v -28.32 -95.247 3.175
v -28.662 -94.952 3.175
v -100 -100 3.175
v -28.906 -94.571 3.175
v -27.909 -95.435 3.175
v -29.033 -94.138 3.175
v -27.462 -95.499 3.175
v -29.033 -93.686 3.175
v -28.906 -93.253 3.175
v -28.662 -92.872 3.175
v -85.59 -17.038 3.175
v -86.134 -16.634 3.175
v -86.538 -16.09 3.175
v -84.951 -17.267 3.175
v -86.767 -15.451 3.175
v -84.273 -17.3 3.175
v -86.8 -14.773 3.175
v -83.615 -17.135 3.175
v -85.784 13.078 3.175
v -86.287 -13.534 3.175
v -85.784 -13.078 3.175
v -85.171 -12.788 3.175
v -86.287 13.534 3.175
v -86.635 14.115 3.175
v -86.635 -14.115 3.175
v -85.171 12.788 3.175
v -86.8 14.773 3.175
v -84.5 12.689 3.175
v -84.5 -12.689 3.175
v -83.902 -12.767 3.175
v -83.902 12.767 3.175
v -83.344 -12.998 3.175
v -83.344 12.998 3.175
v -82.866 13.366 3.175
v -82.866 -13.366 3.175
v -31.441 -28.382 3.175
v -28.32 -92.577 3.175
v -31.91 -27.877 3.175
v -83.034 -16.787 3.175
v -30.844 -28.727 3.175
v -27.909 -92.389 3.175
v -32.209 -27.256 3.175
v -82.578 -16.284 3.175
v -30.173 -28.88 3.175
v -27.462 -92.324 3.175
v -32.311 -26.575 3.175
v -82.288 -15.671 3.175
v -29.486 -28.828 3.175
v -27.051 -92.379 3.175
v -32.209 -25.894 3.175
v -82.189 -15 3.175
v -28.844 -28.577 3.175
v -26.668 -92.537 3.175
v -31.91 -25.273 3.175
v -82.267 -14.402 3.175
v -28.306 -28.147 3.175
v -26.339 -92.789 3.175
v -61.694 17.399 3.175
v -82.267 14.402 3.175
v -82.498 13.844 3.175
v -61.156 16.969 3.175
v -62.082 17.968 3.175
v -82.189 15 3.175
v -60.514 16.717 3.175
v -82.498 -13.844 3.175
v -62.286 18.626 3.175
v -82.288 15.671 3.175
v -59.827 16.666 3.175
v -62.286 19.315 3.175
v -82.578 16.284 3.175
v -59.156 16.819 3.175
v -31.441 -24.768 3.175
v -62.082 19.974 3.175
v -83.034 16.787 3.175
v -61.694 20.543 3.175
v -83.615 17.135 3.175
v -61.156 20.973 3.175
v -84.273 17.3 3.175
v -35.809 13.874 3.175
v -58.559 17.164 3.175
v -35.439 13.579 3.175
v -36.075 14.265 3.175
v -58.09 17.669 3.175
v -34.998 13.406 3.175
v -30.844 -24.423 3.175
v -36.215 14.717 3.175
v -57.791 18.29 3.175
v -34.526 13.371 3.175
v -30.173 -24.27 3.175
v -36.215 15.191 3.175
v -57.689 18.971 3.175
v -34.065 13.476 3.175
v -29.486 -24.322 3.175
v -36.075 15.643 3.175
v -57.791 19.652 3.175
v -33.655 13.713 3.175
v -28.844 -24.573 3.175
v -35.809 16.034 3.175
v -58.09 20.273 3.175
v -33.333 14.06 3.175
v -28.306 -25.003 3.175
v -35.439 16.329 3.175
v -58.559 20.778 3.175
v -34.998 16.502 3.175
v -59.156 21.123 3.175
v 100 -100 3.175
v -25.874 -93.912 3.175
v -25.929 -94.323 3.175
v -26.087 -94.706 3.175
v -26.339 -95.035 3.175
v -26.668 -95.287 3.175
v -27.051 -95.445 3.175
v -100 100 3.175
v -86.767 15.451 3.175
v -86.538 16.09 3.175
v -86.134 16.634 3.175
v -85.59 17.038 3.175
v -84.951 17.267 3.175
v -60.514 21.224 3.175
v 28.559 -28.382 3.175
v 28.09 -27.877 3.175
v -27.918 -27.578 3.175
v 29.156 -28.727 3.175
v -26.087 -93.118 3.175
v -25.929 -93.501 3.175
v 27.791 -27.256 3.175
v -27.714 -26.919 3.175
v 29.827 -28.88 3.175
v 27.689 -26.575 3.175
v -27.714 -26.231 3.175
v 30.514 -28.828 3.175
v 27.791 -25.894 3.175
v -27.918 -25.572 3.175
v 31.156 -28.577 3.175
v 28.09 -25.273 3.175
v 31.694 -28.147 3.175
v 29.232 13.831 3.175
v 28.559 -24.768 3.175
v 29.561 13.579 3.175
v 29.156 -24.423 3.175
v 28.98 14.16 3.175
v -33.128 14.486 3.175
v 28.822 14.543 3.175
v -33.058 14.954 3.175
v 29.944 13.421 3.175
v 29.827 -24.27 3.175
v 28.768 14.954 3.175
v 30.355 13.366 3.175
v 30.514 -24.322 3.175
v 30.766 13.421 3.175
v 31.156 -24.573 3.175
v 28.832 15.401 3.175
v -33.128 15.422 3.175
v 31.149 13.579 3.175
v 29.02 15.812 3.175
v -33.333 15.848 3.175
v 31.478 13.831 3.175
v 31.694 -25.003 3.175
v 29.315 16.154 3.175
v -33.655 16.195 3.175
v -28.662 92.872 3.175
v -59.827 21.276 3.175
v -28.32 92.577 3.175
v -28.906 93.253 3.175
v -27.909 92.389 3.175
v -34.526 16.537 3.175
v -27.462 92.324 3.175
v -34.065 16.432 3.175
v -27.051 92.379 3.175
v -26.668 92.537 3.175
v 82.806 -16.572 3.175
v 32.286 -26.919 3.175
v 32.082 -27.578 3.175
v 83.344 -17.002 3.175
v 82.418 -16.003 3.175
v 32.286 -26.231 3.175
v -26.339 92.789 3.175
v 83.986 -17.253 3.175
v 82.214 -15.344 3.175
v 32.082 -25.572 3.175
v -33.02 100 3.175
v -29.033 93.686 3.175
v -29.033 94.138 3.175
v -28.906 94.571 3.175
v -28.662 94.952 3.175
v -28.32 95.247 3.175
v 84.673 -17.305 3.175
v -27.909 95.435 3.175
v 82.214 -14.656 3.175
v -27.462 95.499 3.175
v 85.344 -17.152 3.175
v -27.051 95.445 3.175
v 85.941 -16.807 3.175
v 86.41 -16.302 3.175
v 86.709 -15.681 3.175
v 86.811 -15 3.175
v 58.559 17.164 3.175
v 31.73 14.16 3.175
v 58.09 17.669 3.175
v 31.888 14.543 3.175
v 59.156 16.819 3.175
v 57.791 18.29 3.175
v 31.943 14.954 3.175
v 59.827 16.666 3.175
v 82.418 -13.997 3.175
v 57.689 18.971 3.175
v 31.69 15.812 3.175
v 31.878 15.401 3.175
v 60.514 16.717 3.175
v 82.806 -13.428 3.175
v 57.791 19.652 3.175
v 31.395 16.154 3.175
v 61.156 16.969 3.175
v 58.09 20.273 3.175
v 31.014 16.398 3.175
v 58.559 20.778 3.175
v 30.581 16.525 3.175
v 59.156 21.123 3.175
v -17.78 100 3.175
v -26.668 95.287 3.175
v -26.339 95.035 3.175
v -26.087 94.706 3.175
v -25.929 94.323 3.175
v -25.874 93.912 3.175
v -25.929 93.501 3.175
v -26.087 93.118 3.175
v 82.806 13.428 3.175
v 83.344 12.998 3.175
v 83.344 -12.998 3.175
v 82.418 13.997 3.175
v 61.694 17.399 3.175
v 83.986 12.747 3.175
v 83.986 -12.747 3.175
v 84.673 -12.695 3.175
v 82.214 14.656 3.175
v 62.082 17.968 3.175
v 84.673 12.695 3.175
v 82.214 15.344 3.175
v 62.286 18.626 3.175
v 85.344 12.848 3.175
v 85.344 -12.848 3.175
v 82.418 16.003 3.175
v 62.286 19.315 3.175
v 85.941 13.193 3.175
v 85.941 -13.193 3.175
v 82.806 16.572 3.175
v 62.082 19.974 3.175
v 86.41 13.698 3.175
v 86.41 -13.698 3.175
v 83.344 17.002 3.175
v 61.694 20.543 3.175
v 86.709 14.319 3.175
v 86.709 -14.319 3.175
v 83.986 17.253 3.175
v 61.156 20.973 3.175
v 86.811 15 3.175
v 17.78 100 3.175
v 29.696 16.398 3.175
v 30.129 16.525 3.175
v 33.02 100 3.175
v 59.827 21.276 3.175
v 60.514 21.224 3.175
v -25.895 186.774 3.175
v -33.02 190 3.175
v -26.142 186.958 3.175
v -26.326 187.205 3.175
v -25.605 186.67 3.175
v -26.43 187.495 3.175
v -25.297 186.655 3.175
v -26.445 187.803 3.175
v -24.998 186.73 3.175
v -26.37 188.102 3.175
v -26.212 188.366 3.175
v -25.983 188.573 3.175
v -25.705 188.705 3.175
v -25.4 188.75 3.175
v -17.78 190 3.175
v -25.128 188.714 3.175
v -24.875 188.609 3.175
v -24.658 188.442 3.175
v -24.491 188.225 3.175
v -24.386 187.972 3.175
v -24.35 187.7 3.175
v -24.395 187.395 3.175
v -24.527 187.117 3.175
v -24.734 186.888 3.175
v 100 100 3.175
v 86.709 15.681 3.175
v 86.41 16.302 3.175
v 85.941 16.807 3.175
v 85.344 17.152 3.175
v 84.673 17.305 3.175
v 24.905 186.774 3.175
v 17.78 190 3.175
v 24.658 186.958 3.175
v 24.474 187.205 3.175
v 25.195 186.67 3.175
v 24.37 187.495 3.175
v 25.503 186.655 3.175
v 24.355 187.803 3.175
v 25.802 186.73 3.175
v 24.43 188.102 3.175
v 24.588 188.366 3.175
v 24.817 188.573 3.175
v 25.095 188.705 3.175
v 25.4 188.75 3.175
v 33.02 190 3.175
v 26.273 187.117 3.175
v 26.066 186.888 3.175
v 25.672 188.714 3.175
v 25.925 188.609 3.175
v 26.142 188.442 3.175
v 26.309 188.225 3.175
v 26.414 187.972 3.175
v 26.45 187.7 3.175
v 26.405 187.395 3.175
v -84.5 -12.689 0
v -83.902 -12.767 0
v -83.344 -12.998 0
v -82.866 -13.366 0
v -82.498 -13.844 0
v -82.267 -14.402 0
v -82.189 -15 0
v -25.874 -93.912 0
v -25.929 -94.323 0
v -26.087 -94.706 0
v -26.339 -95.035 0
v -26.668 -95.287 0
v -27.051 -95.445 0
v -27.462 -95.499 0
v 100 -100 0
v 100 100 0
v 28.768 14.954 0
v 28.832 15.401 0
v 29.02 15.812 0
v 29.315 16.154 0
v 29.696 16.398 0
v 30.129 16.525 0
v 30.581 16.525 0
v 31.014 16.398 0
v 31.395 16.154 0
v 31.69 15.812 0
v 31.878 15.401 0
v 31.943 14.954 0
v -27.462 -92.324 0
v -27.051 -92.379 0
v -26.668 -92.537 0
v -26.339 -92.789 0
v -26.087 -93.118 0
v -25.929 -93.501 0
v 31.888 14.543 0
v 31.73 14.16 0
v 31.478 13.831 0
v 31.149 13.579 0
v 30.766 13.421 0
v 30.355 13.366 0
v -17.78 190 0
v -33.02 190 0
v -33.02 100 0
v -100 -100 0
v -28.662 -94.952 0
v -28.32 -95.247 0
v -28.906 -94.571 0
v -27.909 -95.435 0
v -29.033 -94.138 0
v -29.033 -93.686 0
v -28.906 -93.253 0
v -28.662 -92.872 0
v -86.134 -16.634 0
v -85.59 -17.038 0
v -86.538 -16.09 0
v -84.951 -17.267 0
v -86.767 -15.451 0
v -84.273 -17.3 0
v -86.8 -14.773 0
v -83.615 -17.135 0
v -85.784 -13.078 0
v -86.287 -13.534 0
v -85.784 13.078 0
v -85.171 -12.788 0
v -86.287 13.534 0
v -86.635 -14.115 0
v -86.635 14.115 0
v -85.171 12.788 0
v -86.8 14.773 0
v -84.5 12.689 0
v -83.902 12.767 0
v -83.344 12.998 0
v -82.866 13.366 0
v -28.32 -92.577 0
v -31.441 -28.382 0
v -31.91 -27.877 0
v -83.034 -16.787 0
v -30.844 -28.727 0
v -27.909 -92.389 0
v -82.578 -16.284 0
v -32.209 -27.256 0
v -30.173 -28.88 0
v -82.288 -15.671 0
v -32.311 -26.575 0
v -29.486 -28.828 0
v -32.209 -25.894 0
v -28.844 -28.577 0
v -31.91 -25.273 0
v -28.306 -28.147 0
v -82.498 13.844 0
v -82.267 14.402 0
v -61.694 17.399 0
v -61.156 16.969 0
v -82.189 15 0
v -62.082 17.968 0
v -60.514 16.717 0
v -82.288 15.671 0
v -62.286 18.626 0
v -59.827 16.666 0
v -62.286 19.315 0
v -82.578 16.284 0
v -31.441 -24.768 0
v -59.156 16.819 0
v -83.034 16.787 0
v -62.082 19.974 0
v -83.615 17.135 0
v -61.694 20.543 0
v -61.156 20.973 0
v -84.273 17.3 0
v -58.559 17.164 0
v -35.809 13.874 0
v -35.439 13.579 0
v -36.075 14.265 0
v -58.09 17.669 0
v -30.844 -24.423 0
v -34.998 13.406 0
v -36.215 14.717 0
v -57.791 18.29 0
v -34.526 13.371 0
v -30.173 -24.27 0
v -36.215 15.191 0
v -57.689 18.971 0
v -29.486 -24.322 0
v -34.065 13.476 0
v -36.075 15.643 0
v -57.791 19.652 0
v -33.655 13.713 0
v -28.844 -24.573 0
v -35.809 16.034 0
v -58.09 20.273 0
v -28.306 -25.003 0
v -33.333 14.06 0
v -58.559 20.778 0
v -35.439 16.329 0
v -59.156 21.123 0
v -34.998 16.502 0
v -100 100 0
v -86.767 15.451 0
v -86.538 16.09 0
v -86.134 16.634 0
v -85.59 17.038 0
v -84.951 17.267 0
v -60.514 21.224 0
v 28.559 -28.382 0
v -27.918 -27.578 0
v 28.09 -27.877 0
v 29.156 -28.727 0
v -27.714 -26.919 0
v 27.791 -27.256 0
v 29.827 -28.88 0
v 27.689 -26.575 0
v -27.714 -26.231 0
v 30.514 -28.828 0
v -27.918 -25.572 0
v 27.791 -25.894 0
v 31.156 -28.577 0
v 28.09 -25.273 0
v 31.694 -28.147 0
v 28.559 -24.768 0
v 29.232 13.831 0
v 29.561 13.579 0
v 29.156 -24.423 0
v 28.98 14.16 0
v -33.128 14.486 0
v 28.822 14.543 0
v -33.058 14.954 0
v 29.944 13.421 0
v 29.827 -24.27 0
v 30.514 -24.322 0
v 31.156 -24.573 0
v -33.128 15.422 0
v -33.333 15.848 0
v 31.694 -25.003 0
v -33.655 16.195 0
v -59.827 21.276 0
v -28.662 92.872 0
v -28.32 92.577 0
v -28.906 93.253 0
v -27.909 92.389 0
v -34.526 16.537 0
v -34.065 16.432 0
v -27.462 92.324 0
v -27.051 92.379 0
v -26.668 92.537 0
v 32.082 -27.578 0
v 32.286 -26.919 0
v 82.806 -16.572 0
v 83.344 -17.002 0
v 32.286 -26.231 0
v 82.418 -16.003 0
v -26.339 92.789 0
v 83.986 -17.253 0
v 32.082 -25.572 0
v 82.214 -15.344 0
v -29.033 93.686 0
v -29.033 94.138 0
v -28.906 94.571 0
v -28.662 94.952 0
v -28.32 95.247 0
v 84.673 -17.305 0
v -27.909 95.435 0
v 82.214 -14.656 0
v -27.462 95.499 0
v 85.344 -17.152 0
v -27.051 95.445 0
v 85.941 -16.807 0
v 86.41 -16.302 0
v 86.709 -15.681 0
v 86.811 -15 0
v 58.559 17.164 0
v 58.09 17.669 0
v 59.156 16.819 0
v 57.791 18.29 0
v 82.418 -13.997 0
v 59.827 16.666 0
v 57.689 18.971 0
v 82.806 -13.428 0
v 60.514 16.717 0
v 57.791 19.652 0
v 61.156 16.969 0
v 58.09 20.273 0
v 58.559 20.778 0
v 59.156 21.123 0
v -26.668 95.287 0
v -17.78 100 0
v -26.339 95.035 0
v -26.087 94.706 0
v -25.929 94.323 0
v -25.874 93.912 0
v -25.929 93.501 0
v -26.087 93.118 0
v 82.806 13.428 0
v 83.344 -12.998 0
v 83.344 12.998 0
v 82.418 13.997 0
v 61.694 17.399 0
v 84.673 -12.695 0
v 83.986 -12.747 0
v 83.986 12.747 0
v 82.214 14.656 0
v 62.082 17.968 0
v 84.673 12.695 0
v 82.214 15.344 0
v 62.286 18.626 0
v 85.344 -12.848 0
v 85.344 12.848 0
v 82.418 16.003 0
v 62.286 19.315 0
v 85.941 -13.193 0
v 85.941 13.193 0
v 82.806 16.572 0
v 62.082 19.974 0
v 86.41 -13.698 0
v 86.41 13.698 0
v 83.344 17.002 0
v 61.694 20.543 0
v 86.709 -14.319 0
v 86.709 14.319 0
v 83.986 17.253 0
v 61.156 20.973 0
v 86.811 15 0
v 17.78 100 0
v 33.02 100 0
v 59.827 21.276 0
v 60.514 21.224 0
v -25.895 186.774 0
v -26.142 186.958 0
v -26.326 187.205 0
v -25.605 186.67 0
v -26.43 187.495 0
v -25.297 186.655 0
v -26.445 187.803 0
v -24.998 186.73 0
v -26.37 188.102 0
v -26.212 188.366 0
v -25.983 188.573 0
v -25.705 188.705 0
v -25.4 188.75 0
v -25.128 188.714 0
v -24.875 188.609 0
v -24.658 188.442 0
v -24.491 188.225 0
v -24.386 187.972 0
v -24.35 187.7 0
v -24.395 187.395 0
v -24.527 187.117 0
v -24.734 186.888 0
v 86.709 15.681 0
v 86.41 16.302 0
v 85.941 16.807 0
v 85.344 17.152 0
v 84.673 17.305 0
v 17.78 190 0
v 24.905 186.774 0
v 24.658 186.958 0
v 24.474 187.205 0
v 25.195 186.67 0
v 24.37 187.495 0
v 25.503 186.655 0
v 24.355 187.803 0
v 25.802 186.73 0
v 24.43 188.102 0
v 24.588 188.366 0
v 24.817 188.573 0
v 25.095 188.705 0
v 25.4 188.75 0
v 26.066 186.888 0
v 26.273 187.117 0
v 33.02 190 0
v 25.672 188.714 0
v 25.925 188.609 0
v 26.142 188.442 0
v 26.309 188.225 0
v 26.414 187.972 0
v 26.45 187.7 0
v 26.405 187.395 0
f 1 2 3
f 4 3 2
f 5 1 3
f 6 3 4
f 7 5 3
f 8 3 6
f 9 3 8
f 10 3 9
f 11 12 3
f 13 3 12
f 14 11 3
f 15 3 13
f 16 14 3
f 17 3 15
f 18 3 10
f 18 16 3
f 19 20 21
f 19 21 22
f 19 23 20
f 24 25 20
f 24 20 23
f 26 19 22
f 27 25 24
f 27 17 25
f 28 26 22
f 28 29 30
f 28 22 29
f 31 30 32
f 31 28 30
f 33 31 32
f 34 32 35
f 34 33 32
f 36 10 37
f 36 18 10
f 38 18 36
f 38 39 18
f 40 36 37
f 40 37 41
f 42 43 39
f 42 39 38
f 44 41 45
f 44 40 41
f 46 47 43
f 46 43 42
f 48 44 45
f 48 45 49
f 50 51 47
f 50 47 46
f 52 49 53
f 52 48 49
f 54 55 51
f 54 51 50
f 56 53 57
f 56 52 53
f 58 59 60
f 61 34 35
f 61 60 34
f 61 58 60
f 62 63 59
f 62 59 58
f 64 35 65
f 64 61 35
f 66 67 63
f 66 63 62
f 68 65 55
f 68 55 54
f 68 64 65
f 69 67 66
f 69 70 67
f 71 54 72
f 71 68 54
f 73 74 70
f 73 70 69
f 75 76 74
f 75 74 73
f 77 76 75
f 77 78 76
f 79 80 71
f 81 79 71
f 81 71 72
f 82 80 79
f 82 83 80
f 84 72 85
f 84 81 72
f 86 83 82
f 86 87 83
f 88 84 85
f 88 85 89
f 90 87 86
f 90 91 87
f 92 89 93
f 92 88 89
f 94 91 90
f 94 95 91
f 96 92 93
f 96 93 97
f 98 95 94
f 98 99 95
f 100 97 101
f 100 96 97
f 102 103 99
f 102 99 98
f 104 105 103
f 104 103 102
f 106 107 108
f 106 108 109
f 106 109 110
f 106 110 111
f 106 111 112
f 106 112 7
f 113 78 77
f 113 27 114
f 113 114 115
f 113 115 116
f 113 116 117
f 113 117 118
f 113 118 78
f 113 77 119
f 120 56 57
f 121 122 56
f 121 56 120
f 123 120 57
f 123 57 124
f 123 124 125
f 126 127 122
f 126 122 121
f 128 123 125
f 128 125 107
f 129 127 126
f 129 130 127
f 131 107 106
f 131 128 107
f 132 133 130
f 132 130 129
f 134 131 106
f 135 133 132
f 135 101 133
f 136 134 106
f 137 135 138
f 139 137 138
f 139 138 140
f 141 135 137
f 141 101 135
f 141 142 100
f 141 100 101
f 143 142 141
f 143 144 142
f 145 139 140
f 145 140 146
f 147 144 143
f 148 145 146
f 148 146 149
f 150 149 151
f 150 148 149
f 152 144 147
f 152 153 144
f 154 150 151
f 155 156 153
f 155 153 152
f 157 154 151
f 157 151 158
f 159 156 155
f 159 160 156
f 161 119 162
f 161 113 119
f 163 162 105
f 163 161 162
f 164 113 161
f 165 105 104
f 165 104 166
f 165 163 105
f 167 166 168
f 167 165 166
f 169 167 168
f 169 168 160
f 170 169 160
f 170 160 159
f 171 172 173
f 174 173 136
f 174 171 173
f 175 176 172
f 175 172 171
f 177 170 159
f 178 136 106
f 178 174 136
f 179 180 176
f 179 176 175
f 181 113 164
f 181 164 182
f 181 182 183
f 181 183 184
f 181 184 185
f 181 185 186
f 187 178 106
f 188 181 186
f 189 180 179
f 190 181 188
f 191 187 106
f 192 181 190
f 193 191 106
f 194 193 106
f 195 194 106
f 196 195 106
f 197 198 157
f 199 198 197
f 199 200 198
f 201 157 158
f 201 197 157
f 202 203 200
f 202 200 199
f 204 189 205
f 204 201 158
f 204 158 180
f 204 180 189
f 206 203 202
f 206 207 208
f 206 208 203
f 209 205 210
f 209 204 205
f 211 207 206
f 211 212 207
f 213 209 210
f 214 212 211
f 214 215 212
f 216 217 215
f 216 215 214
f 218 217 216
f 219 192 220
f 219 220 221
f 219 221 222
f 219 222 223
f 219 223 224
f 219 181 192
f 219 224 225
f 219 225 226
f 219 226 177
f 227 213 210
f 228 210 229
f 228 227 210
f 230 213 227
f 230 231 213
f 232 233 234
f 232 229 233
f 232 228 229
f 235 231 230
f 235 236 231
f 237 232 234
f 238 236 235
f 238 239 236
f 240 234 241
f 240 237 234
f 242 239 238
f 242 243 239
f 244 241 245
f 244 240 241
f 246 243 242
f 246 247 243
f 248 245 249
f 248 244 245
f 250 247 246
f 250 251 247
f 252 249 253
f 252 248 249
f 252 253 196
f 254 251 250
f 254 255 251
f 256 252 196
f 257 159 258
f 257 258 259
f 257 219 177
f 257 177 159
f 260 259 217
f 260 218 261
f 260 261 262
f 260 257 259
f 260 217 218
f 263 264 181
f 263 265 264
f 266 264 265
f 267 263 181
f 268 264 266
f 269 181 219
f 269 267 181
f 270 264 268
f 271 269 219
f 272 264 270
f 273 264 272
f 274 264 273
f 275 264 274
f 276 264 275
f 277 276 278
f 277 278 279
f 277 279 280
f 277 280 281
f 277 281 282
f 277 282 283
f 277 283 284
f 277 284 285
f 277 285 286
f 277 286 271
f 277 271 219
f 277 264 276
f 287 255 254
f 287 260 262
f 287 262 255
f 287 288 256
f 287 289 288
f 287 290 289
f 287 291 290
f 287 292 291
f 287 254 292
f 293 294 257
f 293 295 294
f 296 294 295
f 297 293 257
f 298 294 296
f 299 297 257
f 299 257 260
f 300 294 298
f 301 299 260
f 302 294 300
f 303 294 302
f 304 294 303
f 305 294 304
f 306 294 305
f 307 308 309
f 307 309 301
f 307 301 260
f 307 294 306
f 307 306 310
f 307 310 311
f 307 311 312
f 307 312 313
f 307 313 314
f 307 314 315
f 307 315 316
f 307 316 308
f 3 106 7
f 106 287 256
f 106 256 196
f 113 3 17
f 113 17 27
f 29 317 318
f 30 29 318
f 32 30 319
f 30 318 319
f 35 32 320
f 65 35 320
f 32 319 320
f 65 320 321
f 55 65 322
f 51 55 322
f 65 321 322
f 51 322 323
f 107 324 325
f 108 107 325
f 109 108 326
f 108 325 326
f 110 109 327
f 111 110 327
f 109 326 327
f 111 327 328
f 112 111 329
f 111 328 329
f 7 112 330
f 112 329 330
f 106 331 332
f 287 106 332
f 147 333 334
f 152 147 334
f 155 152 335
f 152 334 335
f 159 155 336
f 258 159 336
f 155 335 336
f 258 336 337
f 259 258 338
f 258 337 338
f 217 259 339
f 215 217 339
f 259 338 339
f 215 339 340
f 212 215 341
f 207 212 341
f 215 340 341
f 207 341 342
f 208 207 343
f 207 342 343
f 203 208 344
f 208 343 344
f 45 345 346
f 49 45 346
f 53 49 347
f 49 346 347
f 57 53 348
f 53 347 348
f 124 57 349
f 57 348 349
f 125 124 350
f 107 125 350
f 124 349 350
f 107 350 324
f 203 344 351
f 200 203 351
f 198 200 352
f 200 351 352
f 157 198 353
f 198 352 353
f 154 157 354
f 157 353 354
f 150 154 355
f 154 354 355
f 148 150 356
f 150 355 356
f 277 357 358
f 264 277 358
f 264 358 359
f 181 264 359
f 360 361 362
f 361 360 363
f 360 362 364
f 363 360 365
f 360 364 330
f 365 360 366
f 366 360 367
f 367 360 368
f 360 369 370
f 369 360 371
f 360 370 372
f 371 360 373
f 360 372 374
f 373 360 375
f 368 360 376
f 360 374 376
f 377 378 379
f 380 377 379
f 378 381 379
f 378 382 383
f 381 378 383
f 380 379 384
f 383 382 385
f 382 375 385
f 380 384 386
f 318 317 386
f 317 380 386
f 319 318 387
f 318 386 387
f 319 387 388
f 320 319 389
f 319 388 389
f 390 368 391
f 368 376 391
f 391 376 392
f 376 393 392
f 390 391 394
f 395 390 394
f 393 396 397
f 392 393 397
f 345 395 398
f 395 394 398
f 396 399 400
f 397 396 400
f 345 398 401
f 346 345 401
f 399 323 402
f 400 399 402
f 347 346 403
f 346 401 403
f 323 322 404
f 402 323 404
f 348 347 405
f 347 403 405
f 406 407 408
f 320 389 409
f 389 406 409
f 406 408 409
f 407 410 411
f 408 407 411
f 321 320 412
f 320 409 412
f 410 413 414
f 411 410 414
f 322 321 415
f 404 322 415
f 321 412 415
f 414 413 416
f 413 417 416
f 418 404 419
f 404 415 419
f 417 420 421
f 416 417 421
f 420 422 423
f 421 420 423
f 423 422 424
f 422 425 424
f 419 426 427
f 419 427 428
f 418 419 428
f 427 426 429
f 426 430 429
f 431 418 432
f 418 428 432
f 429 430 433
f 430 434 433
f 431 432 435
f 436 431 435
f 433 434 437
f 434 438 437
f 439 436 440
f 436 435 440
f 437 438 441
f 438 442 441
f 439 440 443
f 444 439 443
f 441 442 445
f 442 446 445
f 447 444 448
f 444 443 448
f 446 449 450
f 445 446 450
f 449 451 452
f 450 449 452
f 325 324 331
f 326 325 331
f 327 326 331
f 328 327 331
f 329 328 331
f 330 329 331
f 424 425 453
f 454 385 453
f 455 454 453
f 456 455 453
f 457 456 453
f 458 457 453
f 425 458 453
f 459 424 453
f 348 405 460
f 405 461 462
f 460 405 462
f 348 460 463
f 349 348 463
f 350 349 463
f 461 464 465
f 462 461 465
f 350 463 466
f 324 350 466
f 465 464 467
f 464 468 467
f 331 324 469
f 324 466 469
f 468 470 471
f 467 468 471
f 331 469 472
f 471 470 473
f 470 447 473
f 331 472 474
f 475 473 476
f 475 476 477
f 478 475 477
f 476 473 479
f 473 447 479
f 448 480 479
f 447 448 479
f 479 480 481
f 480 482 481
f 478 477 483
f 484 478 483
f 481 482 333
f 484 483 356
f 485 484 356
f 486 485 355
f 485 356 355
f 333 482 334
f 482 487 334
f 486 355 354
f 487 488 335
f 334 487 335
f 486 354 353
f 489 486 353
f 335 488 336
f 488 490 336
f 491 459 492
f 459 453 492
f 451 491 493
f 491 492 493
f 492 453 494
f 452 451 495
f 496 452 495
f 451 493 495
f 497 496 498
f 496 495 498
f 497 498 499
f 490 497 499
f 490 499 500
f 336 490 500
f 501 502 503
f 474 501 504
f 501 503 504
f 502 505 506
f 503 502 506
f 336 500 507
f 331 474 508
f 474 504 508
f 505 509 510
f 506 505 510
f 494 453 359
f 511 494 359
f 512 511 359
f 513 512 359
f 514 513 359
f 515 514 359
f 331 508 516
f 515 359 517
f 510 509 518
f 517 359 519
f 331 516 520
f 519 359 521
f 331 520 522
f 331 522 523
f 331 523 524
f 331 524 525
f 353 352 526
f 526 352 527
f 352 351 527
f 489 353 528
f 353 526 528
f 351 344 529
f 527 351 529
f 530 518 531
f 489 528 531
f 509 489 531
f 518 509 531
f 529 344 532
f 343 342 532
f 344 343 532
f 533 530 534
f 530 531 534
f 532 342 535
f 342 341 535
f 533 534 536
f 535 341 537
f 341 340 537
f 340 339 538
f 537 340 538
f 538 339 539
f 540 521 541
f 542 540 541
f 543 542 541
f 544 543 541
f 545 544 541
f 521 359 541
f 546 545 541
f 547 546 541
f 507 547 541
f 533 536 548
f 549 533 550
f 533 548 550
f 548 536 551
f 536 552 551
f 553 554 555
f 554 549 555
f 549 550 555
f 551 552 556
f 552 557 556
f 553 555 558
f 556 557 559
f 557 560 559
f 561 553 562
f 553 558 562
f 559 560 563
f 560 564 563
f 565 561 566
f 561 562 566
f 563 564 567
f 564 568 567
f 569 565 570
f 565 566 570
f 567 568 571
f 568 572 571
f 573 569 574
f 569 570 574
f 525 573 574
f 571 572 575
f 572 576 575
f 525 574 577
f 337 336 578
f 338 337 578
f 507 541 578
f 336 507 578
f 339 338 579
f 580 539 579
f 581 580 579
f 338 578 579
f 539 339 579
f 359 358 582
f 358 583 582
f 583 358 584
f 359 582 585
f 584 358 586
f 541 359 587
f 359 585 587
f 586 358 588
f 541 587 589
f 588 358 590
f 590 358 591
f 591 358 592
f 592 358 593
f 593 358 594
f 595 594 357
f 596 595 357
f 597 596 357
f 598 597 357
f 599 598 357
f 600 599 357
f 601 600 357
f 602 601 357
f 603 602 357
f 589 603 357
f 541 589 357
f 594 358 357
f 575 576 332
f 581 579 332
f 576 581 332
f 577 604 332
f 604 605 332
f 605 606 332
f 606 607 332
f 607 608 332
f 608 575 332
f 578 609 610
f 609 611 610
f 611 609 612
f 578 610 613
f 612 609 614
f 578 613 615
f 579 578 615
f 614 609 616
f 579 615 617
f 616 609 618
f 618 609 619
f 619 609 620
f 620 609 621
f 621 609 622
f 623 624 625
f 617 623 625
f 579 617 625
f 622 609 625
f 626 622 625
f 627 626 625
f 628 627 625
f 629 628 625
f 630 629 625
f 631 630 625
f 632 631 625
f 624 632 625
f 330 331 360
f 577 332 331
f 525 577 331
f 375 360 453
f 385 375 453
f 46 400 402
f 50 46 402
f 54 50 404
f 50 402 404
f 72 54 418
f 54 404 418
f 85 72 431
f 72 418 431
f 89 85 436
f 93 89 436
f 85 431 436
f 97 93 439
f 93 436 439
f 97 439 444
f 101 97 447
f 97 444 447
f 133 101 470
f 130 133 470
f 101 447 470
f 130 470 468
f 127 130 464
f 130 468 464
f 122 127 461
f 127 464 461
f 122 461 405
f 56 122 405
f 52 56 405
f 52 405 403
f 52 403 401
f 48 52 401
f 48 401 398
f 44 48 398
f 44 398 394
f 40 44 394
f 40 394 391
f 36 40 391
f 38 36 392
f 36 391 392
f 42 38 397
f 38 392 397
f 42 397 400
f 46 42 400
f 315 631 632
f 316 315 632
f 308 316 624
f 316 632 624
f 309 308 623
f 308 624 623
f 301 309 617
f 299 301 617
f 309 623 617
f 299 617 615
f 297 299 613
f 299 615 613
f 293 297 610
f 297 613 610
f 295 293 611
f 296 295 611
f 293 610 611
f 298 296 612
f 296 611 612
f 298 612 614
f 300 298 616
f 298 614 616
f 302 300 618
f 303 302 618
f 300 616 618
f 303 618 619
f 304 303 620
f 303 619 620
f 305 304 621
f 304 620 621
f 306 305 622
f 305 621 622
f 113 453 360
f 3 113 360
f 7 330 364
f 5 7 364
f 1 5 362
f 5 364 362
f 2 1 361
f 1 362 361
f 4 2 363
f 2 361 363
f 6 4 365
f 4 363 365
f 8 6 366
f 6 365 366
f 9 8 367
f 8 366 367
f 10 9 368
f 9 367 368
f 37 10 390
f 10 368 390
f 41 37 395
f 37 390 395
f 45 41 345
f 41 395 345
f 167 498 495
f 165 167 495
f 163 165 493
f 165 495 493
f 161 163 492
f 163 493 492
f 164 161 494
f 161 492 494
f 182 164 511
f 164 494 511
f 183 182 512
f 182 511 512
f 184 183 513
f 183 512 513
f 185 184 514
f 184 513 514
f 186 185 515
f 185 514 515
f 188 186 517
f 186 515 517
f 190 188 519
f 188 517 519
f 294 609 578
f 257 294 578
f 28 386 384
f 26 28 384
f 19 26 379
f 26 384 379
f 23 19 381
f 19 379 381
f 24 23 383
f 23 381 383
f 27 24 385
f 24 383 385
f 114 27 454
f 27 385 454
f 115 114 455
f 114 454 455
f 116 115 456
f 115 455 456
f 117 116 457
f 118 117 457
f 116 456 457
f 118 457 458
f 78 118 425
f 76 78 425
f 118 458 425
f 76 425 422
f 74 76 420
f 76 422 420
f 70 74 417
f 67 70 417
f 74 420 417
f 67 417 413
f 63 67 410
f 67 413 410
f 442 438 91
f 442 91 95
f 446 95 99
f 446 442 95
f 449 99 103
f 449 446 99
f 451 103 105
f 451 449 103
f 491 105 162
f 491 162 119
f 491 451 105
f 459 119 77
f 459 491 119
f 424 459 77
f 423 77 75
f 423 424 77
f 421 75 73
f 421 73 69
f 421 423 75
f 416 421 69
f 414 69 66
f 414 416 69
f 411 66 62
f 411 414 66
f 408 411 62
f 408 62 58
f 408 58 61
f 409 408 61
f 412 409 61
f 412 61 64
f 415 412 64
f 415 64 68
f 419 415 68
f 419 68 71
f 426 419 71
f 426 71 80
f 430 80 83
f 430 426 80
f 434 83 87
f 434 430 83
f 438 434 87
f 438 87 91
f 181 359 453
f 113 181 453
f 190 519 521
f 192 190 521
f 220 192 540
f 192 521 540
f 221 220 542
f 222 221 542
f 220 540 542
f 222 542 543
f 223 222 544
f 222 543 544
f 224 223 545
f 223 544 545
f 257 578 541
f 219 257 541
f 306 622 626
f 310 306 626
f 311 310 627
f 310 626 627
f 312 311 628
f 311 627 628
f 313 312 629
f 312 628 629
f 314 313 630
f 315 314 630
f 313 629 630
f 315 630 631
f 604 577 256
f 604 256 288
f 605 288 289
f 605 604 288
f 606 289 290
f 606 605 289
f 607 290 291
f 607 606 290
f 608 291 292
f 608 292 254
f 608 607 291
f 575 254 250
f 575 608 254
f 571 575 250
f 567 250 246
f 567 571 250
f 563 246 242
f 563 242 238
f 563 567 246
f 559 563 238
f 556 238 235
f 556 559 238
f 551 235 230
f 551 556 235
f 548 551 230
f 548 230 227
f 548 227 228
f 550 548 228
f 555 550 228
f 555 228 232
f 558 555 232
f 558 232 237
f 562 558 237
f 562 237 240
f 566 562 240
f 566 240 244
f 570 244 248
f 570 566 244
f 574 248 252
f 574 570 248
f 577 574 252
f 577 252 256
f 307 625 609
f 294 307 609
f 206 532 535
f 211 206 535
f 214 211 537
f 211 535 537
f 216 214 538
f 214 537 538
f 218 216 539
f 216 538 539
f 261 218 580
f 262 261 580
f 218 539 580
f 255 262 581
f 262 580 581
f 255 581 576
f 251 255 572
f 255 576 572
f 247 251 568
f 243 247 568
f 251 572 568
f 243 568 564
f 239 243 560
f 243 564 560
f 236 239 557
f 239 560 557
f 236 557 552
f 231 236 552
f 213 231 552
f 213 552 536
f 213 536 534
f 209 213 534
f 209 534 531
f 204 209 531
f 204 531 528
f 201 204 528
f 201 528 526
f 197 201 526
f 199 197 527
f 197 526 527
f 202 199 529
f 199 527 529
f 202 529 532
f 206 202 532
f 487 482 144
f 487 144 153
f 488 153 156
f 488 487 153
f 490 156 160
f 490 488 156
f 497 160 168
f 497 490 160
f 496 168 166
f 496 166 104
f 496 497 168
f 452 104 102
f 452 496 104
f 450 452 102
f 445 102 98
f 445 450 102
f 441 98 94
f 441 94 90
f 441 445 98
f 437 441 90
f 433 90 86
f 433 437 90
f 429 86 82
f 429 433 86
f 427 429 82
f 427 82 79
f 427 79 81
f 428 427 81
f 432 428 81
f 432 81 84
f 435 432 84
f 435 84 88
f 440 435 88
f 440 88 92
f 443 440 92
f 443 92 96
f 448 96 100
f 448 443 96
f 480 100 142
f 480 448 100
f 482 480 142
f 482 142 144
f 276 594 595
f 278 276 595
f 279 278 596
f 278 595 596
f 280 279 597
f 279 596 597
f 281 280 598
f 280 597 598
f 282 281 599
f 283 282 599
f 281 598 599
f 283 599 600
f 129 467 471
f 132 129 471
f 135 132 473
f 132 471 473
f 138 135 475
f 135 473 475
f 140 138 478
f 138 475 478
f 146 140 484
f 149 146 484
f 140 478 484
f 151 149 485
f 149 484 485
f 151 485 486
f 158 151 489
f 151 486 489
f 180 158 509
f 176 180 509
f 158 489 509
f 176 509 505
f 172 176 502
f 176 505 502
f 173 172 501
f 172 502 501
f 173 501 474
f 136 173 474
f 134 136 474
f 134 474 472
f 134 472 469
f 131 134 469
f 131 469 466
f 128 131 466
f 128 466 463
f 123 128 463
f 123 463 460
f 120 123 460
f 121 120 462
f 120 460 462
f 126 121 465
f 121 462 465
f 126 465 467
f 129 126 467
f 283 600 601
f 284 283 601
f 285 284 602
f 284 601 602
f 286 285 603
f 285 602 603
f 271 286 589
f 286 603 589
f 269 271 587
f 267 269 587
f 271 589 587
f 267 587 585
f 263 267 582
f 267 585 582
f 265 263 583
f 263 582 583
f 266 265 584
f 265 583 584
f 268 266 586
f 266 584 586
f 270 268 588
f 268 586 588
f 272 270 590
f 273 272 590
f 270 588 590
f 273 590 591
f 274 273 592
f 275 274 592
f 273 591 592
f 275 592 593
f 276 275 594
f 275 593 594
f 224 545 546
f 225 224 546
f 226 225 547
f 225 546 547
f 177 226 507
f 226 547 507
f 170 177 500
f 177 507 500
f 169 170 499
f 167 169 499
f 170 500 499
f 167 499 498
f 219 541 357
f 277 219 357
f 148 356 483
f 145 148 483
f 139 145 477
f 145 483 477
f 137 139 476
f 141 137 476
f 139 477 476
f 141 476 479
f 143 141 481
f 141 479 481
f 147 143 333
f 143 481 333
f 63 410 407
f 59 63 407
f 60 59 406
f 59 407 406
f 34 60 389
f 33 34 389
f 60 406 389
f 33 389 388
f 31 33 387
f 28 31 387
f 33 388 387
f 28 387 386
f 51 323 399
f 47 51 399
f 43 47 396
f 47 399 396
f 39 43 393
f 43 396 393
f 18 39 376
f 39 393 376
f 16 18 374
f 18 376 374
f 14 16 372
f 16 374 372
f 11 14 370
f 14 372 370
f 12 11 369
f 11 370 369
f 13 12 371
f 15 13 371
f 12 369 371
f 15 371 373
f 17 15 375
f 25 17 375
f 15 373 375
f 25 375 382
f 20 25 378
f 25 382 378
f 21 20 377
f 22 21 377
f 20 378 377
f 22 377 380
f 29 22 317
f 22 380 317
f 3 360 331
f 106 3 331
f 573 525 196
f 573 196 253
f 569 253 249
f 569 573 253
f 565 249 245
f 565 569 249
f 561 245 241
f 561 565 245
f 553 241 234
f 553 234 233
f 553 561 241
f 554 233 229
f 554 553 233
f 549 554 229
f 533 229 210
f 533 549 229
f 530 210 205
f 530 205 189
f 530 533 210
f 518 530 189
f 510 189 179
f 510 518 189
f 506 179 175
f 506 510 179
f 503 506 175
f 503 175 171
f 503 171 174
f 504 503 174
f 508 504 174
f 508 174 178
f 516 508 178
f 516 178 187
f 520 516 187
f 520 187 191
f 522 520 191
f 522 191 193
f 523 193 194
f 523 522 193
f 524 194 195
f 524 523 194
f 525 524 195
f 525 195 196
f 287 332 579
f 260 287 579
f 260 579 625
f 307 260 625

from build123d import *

# Parameters (mm, degrees)
F0_W     = 51.8
F0_H     = 10
F0_W_2   = 15.24
F0_H_2   = 34.925
F0_R     = 2.3114
F0_R_2   = 1.05
F0_R_3   = 1.5875
F0_W_3   = 9.38
F1_DEPTH = 3.175
F2_DEPTH = 90


# Not quite as in the source:
# - a length typed as a fraction of an inch, garbled in the dataset ("3 / 203.2 mm" for 3/8 in), is restored
# - a feature names something its author has since deleted; it is built from what else it names


with BuildPart() as f1:
    # F0 (on Top) → F1 (new body)
    with BuildSketch(Plane.XY):
        Polygon((42.4, -100), (100, -100), (100, -75.075), (48.2, -75.075), (48.2, -65.075), (33.02, -65.075), (33.02, -100), align=None)
        with Locations((74.1, -70.075)):
            Rectangle(F0_W, F0_H)
        Polygon((33.02, -140), (33.02, -100), (17.78, -100), (17.78, -140), (17.78, -190), (25.4, -190), (33.02, -190), align=None)
        with BuildLine():
            ThreePointArc((26.45, -187.7), (26.1424621202, -188.4424621202), (25.4, -188.75))
            ThreePointArc((25.4, -188.75), (24.6575378798, -186.9575378798), (26.45, -187.7))
        make_face(mode=Mode.SUBTRACT)
        with Locations((25.4, -82.5375)):
            Rectangle(F0_W_2, F0_H_2)
        with Locations((74.1, -60.075)):
            Rectangle(F0_W, F0_H)
        Polygon((0, -100), (17.78, -100), (17.78, -65.075), (-17.78, -65.075), (-17.78, -100), align=None)
        Polygon((17.78, -65.075), (33.02, -65.075), (48.2, -65.075), (48.2, -55.075), (-48.2, -55.075), (-48.2, -65.075), (-33.02, -65.075), (-17.78, -65.075), align=None)
        with BuildLine():
            Line((48.2, -55.075), (100, -55.075))
            Line((100, -55.075), (100, -26.575))
            Line((100, -26.575), (32.3114, -26.575))
            ThreePointArc((32.3114, -26.575), (30, -28.8864), (27.6886, -26.575))
            Line((27.6886, -26.575), (0, -26.575))
            Line((0, -26.575), (-27.6886, -26.575))
            ThreePointArc((-27.6886, -26.575), (-30, -28.8864), (-32.3114, -26.575))
            Line((-32.3114, -26.575), (-100, -26.575))
            Line((-100, -26.575), (-100, -55.075))
            Line((-100, -55.075), (-48.2, -55.075))
            Line((-48.2, -55.075), (48.2, -55.075))
        make_face()
        with BuildLine():
            Line((32.3114, -26.575), (100, -26.575))
            Line((100, -26.575), (100, 0))
            Line((100, 0), (0, 0))
            Line((0, 0), (0, -10.4469014332))
            Line((0, -10.4469014332), (0, -26.575))
            Line((0, -26.575), (27.6886, -26.575))
            ThreePointArc((27.6886, -26.575), (30, -24.2636), (32.3114, -26.575))
        make_face()
        with Locations((84.5, -15)):
            Circle(F0_R, mode=Mode.SUBTRACT)
        Polygon((-17.78, -140), (-17.78, -100), (-27.462, -100), (-33.02, -100), (-33.02, -140), (-33.02, -190), (-25.4, -190), (-17.78, -190), align=None)
        with BuildLine():
            ThreePointArc((-24.35, -187.7), (-24.6575378798, -188.4424621202), (-25.4, -188.75))
            ThreePointArc((-25.4, -188.75), (-26.1424621202, -186.9575378798), (-24.35, -187.7))
        make_face(mode=Mode.SUBTRACT)
        with Locations((-25.4, -137.7)):
            Circle(F0_R_2, mode=Mode.SUBTRACT)
        Polygon((-27.462, -100), (-17.78, -100), (-17.78, -65.075), (-33.02, -65.075), (-33.02, -100), align=None)
        with BuildLine():
            ThreePointArc((-25.8745, -93.912), (-26.3394679849, -95.0345320151), (-27.462, -95.4995))
            ThreePointArc((-27.462, -95.4995), (-29.0495, -93.912), (-27.462, -92.3245))
            ThreePointArc((-27.462, -92.3245), (-26.3394679849, -92.7894679849), (-25.8745, -93.912))
        make_face(mode=Mode.SUBTRACT)
        with BuildLine():
            Line((0, 0), (100, 0))
            Line((100, 0), (100, 55.075))
            Line((100, 55.075), (48.2, 55.075))
            Line((48.2, 55.075), (48.2, 65.075))
            Line((48.2, 65.075), (42.4, 65.075))
            Line((42.4, 65.075), (42.4, 18.9709383994))
            Line((42.4, 18.9709383994), (42.4, 9.75))
            Line((42.4, 9.75), (30.355, 9.75))
            Line((30.355, 9.75), (-42.4, 9.75))
            Line((-42.4, 9.75), (-42.4, 65.075))
            Line((-42.4, 65.075), (-48.2, 65.075))
            Line((-48.2, 65.075), (-48.2, 55.075))
            Line((-48.2, 55.075), (-100, 55.075))
            Line((-100, 55.075), (-100, 0))
            Line((-100, 0), (-100, -26.575))
            Line((-100, -26.575), (-32.3114, -26.575))
            ThreePointArc((-32.3114, -26.575), (-30, -24.2636), (-27.6886, -26.575))
            Line((-27.6886, -26.575), (0, -26.575))
            Line((0, -26.575), (0, -10.4469014332))
            Line((0, -10.4469014332), (0, 0))
        make_face()
        with BuildLine():
            ThreePointArc((-82.1886, -15), (-86.134406614, -16.634406614), (-84.5, -12.6886))
            ThreePointArc((-84.5, -12.6886), (-82.865593386, -13.365593386), (-82.1886, -15))
        make_face(mode=Mode.SUBTRACT)
        with BuildLine():
            ThreePointArc((-82.1886, 15), (-82.865593386, 13.365593386), (-84.5, 12.6886))
            ThreePointArc((-84.5, 12.6886), (-86.134406614, 16.634406614), (-82.1886, 15))
        make_face(mode=Mode.SUBTRACT)
        with Locations((-60, 18.9709383994)):
            Circle(F0_R, mode=Mode.SUBTRACT)
        with BuildLine():
            ThreePointArc((62.3114, 18.9709383994), (60, 16.6595383994), (57.6886, 18.9709383994))
            ThreePointArc((57.6886, 18.9709383994), (60, 21.2823383994), (62.3114, 18.9709383994))
        make_face(mode=Mode.SUBTRACT)
        with Locations((84.5, 15)):
            Circle(F0_R, mode=Mode.SUBTRACT)
        with Locations((-74.1, -60.075)):
            Rectangle(F0_W, F0_H)
        Polygon((-33.02, -100), (-33.02, -65.075), (-48.2, -65.075), (-48.2, -75.075), (-100, -75.075), (-100, -100), (-42.4, -100), align=None)
        with Locations((74.1, 60.075)):
            Rectangle(F0_W, F0_H)
        with Locations((-74.1, -70.075)):
            Rectangle(F0_W, F0_H)
        with Locations((74.1, 70.075)):
            Rectangle(F0_W, F0_H)
        Polygon((48.2, 75.075), (100, 75.075), (100, 100), (42.4, 100), (42.4, 65.075), (48.2, 65.075), align=None)
        Polygon((42.4, 18.9709383994), (42.4, 65.075), (42.4, 100), (33.02, 100), (17.78, 100), (0, 100), (-17.78, 100), (-27.462, 100), (-33.02, 100), (-33.02, 65.075), (-42.4, 65.075), (-42.4, 9.75), (30.355, 9.75), (42.4, 9.75), align=None)
        with Locations((-34.645, 14.954)):
            Circle(F0_R_3, mode=Mode.SUBTRACT)
        with BuildLine():
            ThreePointArc((-27.462, 92.3245), (-29.0495, 93.912), (-27.462, 95.4995))
            ThreePointArc((-27.462, 95.4995), (-26.3394679849, 95.0345320151), (-25.8745, 93.912))
            ThreePointArc((-25.8745, 93.912), (-26.3394679849, 92.7894679849), (-27.462, 92.3245))
        make_face(mode=Mode.SUBTRACT)
        with BuildLine():
            ThreePointArc((31.9425, 14.954), (31.4775320151, 13.8314679849), (30.355, 13.3665))
            ThreePointArc((30.355, 13.3665), (29.2324679849, 13.8314679849), (28.7675, 14.954))
            ThreePointArc((28.7675, 14.954), (30.355, 16.5415), (31.9425, 14.954))
        make_face(mode=Mode.SUBTRACT)
        with Locations((-74.1, 60.075)):
            Rectangle(F0_W, F0_H)
        with Locations((-74.1, 70.075)):
            Rectangle(F0_W, F0_H)
        Polygon((17.78, 100), (33.02, 100), (33.02, 140), (33.02, 190), (25.4, 190), (17.78, 190), (17.78, 140), align=None)
        with BuildLine():
            ThreePointArc((26.45, 187.7), (24.6575378798, 186.9575378798), (25.4, 188.75))
            ThreePointArc((25.4, 188.75), (26.1424621202, 188.4424621202), (26.45, 187.7))
        make_face(mode=Mode.SUBTRACT)
        Polygon((-100, 100), (-100, 75.075), (-48.2, 75.075), (-48.2, 65.075), (-42.4, 65.075), (-42.4, 100), align=None)
        with Locations((-37.71, 82.5375)):
            Rectangle(F0_W_3, F0_H_2)
        Polygon((-27.462, 100), (-17.78, 100), (-17.78, 140), (-17.78, 190), (-25.4, 190), (-33.02, 190), (-33.02, 140), (-33.02, 100), align=None)
        with BuildLine():
            ThreePointArc((-24.35, 187.7), (-26.1424621202, 186.9575378798), (-25.4, 188.75))
            ThreePointArc((-25.4, 188.75), (-24.6575378798, 188.4424621202), (-24.35, 187.7))
        make_face(mode=Mode.SUBTRACT)
        with Locations((-25.4, -137.7)):
            Circle(F0_R_2)
    extrude(amount=F1_DEPTH)

    # F2 (cut): faces of the model
    f2_faces = [f1.faces().sort_by_distance(p)[0] for p in [
        (25.4, -190, 1.5875),
        (-25.4, -190, 1.5875),
    ]]
    extrude(f2_faces, amount=-F2_DEPTH, mode=Mode.SUBTRACT)


solid = f1.part
